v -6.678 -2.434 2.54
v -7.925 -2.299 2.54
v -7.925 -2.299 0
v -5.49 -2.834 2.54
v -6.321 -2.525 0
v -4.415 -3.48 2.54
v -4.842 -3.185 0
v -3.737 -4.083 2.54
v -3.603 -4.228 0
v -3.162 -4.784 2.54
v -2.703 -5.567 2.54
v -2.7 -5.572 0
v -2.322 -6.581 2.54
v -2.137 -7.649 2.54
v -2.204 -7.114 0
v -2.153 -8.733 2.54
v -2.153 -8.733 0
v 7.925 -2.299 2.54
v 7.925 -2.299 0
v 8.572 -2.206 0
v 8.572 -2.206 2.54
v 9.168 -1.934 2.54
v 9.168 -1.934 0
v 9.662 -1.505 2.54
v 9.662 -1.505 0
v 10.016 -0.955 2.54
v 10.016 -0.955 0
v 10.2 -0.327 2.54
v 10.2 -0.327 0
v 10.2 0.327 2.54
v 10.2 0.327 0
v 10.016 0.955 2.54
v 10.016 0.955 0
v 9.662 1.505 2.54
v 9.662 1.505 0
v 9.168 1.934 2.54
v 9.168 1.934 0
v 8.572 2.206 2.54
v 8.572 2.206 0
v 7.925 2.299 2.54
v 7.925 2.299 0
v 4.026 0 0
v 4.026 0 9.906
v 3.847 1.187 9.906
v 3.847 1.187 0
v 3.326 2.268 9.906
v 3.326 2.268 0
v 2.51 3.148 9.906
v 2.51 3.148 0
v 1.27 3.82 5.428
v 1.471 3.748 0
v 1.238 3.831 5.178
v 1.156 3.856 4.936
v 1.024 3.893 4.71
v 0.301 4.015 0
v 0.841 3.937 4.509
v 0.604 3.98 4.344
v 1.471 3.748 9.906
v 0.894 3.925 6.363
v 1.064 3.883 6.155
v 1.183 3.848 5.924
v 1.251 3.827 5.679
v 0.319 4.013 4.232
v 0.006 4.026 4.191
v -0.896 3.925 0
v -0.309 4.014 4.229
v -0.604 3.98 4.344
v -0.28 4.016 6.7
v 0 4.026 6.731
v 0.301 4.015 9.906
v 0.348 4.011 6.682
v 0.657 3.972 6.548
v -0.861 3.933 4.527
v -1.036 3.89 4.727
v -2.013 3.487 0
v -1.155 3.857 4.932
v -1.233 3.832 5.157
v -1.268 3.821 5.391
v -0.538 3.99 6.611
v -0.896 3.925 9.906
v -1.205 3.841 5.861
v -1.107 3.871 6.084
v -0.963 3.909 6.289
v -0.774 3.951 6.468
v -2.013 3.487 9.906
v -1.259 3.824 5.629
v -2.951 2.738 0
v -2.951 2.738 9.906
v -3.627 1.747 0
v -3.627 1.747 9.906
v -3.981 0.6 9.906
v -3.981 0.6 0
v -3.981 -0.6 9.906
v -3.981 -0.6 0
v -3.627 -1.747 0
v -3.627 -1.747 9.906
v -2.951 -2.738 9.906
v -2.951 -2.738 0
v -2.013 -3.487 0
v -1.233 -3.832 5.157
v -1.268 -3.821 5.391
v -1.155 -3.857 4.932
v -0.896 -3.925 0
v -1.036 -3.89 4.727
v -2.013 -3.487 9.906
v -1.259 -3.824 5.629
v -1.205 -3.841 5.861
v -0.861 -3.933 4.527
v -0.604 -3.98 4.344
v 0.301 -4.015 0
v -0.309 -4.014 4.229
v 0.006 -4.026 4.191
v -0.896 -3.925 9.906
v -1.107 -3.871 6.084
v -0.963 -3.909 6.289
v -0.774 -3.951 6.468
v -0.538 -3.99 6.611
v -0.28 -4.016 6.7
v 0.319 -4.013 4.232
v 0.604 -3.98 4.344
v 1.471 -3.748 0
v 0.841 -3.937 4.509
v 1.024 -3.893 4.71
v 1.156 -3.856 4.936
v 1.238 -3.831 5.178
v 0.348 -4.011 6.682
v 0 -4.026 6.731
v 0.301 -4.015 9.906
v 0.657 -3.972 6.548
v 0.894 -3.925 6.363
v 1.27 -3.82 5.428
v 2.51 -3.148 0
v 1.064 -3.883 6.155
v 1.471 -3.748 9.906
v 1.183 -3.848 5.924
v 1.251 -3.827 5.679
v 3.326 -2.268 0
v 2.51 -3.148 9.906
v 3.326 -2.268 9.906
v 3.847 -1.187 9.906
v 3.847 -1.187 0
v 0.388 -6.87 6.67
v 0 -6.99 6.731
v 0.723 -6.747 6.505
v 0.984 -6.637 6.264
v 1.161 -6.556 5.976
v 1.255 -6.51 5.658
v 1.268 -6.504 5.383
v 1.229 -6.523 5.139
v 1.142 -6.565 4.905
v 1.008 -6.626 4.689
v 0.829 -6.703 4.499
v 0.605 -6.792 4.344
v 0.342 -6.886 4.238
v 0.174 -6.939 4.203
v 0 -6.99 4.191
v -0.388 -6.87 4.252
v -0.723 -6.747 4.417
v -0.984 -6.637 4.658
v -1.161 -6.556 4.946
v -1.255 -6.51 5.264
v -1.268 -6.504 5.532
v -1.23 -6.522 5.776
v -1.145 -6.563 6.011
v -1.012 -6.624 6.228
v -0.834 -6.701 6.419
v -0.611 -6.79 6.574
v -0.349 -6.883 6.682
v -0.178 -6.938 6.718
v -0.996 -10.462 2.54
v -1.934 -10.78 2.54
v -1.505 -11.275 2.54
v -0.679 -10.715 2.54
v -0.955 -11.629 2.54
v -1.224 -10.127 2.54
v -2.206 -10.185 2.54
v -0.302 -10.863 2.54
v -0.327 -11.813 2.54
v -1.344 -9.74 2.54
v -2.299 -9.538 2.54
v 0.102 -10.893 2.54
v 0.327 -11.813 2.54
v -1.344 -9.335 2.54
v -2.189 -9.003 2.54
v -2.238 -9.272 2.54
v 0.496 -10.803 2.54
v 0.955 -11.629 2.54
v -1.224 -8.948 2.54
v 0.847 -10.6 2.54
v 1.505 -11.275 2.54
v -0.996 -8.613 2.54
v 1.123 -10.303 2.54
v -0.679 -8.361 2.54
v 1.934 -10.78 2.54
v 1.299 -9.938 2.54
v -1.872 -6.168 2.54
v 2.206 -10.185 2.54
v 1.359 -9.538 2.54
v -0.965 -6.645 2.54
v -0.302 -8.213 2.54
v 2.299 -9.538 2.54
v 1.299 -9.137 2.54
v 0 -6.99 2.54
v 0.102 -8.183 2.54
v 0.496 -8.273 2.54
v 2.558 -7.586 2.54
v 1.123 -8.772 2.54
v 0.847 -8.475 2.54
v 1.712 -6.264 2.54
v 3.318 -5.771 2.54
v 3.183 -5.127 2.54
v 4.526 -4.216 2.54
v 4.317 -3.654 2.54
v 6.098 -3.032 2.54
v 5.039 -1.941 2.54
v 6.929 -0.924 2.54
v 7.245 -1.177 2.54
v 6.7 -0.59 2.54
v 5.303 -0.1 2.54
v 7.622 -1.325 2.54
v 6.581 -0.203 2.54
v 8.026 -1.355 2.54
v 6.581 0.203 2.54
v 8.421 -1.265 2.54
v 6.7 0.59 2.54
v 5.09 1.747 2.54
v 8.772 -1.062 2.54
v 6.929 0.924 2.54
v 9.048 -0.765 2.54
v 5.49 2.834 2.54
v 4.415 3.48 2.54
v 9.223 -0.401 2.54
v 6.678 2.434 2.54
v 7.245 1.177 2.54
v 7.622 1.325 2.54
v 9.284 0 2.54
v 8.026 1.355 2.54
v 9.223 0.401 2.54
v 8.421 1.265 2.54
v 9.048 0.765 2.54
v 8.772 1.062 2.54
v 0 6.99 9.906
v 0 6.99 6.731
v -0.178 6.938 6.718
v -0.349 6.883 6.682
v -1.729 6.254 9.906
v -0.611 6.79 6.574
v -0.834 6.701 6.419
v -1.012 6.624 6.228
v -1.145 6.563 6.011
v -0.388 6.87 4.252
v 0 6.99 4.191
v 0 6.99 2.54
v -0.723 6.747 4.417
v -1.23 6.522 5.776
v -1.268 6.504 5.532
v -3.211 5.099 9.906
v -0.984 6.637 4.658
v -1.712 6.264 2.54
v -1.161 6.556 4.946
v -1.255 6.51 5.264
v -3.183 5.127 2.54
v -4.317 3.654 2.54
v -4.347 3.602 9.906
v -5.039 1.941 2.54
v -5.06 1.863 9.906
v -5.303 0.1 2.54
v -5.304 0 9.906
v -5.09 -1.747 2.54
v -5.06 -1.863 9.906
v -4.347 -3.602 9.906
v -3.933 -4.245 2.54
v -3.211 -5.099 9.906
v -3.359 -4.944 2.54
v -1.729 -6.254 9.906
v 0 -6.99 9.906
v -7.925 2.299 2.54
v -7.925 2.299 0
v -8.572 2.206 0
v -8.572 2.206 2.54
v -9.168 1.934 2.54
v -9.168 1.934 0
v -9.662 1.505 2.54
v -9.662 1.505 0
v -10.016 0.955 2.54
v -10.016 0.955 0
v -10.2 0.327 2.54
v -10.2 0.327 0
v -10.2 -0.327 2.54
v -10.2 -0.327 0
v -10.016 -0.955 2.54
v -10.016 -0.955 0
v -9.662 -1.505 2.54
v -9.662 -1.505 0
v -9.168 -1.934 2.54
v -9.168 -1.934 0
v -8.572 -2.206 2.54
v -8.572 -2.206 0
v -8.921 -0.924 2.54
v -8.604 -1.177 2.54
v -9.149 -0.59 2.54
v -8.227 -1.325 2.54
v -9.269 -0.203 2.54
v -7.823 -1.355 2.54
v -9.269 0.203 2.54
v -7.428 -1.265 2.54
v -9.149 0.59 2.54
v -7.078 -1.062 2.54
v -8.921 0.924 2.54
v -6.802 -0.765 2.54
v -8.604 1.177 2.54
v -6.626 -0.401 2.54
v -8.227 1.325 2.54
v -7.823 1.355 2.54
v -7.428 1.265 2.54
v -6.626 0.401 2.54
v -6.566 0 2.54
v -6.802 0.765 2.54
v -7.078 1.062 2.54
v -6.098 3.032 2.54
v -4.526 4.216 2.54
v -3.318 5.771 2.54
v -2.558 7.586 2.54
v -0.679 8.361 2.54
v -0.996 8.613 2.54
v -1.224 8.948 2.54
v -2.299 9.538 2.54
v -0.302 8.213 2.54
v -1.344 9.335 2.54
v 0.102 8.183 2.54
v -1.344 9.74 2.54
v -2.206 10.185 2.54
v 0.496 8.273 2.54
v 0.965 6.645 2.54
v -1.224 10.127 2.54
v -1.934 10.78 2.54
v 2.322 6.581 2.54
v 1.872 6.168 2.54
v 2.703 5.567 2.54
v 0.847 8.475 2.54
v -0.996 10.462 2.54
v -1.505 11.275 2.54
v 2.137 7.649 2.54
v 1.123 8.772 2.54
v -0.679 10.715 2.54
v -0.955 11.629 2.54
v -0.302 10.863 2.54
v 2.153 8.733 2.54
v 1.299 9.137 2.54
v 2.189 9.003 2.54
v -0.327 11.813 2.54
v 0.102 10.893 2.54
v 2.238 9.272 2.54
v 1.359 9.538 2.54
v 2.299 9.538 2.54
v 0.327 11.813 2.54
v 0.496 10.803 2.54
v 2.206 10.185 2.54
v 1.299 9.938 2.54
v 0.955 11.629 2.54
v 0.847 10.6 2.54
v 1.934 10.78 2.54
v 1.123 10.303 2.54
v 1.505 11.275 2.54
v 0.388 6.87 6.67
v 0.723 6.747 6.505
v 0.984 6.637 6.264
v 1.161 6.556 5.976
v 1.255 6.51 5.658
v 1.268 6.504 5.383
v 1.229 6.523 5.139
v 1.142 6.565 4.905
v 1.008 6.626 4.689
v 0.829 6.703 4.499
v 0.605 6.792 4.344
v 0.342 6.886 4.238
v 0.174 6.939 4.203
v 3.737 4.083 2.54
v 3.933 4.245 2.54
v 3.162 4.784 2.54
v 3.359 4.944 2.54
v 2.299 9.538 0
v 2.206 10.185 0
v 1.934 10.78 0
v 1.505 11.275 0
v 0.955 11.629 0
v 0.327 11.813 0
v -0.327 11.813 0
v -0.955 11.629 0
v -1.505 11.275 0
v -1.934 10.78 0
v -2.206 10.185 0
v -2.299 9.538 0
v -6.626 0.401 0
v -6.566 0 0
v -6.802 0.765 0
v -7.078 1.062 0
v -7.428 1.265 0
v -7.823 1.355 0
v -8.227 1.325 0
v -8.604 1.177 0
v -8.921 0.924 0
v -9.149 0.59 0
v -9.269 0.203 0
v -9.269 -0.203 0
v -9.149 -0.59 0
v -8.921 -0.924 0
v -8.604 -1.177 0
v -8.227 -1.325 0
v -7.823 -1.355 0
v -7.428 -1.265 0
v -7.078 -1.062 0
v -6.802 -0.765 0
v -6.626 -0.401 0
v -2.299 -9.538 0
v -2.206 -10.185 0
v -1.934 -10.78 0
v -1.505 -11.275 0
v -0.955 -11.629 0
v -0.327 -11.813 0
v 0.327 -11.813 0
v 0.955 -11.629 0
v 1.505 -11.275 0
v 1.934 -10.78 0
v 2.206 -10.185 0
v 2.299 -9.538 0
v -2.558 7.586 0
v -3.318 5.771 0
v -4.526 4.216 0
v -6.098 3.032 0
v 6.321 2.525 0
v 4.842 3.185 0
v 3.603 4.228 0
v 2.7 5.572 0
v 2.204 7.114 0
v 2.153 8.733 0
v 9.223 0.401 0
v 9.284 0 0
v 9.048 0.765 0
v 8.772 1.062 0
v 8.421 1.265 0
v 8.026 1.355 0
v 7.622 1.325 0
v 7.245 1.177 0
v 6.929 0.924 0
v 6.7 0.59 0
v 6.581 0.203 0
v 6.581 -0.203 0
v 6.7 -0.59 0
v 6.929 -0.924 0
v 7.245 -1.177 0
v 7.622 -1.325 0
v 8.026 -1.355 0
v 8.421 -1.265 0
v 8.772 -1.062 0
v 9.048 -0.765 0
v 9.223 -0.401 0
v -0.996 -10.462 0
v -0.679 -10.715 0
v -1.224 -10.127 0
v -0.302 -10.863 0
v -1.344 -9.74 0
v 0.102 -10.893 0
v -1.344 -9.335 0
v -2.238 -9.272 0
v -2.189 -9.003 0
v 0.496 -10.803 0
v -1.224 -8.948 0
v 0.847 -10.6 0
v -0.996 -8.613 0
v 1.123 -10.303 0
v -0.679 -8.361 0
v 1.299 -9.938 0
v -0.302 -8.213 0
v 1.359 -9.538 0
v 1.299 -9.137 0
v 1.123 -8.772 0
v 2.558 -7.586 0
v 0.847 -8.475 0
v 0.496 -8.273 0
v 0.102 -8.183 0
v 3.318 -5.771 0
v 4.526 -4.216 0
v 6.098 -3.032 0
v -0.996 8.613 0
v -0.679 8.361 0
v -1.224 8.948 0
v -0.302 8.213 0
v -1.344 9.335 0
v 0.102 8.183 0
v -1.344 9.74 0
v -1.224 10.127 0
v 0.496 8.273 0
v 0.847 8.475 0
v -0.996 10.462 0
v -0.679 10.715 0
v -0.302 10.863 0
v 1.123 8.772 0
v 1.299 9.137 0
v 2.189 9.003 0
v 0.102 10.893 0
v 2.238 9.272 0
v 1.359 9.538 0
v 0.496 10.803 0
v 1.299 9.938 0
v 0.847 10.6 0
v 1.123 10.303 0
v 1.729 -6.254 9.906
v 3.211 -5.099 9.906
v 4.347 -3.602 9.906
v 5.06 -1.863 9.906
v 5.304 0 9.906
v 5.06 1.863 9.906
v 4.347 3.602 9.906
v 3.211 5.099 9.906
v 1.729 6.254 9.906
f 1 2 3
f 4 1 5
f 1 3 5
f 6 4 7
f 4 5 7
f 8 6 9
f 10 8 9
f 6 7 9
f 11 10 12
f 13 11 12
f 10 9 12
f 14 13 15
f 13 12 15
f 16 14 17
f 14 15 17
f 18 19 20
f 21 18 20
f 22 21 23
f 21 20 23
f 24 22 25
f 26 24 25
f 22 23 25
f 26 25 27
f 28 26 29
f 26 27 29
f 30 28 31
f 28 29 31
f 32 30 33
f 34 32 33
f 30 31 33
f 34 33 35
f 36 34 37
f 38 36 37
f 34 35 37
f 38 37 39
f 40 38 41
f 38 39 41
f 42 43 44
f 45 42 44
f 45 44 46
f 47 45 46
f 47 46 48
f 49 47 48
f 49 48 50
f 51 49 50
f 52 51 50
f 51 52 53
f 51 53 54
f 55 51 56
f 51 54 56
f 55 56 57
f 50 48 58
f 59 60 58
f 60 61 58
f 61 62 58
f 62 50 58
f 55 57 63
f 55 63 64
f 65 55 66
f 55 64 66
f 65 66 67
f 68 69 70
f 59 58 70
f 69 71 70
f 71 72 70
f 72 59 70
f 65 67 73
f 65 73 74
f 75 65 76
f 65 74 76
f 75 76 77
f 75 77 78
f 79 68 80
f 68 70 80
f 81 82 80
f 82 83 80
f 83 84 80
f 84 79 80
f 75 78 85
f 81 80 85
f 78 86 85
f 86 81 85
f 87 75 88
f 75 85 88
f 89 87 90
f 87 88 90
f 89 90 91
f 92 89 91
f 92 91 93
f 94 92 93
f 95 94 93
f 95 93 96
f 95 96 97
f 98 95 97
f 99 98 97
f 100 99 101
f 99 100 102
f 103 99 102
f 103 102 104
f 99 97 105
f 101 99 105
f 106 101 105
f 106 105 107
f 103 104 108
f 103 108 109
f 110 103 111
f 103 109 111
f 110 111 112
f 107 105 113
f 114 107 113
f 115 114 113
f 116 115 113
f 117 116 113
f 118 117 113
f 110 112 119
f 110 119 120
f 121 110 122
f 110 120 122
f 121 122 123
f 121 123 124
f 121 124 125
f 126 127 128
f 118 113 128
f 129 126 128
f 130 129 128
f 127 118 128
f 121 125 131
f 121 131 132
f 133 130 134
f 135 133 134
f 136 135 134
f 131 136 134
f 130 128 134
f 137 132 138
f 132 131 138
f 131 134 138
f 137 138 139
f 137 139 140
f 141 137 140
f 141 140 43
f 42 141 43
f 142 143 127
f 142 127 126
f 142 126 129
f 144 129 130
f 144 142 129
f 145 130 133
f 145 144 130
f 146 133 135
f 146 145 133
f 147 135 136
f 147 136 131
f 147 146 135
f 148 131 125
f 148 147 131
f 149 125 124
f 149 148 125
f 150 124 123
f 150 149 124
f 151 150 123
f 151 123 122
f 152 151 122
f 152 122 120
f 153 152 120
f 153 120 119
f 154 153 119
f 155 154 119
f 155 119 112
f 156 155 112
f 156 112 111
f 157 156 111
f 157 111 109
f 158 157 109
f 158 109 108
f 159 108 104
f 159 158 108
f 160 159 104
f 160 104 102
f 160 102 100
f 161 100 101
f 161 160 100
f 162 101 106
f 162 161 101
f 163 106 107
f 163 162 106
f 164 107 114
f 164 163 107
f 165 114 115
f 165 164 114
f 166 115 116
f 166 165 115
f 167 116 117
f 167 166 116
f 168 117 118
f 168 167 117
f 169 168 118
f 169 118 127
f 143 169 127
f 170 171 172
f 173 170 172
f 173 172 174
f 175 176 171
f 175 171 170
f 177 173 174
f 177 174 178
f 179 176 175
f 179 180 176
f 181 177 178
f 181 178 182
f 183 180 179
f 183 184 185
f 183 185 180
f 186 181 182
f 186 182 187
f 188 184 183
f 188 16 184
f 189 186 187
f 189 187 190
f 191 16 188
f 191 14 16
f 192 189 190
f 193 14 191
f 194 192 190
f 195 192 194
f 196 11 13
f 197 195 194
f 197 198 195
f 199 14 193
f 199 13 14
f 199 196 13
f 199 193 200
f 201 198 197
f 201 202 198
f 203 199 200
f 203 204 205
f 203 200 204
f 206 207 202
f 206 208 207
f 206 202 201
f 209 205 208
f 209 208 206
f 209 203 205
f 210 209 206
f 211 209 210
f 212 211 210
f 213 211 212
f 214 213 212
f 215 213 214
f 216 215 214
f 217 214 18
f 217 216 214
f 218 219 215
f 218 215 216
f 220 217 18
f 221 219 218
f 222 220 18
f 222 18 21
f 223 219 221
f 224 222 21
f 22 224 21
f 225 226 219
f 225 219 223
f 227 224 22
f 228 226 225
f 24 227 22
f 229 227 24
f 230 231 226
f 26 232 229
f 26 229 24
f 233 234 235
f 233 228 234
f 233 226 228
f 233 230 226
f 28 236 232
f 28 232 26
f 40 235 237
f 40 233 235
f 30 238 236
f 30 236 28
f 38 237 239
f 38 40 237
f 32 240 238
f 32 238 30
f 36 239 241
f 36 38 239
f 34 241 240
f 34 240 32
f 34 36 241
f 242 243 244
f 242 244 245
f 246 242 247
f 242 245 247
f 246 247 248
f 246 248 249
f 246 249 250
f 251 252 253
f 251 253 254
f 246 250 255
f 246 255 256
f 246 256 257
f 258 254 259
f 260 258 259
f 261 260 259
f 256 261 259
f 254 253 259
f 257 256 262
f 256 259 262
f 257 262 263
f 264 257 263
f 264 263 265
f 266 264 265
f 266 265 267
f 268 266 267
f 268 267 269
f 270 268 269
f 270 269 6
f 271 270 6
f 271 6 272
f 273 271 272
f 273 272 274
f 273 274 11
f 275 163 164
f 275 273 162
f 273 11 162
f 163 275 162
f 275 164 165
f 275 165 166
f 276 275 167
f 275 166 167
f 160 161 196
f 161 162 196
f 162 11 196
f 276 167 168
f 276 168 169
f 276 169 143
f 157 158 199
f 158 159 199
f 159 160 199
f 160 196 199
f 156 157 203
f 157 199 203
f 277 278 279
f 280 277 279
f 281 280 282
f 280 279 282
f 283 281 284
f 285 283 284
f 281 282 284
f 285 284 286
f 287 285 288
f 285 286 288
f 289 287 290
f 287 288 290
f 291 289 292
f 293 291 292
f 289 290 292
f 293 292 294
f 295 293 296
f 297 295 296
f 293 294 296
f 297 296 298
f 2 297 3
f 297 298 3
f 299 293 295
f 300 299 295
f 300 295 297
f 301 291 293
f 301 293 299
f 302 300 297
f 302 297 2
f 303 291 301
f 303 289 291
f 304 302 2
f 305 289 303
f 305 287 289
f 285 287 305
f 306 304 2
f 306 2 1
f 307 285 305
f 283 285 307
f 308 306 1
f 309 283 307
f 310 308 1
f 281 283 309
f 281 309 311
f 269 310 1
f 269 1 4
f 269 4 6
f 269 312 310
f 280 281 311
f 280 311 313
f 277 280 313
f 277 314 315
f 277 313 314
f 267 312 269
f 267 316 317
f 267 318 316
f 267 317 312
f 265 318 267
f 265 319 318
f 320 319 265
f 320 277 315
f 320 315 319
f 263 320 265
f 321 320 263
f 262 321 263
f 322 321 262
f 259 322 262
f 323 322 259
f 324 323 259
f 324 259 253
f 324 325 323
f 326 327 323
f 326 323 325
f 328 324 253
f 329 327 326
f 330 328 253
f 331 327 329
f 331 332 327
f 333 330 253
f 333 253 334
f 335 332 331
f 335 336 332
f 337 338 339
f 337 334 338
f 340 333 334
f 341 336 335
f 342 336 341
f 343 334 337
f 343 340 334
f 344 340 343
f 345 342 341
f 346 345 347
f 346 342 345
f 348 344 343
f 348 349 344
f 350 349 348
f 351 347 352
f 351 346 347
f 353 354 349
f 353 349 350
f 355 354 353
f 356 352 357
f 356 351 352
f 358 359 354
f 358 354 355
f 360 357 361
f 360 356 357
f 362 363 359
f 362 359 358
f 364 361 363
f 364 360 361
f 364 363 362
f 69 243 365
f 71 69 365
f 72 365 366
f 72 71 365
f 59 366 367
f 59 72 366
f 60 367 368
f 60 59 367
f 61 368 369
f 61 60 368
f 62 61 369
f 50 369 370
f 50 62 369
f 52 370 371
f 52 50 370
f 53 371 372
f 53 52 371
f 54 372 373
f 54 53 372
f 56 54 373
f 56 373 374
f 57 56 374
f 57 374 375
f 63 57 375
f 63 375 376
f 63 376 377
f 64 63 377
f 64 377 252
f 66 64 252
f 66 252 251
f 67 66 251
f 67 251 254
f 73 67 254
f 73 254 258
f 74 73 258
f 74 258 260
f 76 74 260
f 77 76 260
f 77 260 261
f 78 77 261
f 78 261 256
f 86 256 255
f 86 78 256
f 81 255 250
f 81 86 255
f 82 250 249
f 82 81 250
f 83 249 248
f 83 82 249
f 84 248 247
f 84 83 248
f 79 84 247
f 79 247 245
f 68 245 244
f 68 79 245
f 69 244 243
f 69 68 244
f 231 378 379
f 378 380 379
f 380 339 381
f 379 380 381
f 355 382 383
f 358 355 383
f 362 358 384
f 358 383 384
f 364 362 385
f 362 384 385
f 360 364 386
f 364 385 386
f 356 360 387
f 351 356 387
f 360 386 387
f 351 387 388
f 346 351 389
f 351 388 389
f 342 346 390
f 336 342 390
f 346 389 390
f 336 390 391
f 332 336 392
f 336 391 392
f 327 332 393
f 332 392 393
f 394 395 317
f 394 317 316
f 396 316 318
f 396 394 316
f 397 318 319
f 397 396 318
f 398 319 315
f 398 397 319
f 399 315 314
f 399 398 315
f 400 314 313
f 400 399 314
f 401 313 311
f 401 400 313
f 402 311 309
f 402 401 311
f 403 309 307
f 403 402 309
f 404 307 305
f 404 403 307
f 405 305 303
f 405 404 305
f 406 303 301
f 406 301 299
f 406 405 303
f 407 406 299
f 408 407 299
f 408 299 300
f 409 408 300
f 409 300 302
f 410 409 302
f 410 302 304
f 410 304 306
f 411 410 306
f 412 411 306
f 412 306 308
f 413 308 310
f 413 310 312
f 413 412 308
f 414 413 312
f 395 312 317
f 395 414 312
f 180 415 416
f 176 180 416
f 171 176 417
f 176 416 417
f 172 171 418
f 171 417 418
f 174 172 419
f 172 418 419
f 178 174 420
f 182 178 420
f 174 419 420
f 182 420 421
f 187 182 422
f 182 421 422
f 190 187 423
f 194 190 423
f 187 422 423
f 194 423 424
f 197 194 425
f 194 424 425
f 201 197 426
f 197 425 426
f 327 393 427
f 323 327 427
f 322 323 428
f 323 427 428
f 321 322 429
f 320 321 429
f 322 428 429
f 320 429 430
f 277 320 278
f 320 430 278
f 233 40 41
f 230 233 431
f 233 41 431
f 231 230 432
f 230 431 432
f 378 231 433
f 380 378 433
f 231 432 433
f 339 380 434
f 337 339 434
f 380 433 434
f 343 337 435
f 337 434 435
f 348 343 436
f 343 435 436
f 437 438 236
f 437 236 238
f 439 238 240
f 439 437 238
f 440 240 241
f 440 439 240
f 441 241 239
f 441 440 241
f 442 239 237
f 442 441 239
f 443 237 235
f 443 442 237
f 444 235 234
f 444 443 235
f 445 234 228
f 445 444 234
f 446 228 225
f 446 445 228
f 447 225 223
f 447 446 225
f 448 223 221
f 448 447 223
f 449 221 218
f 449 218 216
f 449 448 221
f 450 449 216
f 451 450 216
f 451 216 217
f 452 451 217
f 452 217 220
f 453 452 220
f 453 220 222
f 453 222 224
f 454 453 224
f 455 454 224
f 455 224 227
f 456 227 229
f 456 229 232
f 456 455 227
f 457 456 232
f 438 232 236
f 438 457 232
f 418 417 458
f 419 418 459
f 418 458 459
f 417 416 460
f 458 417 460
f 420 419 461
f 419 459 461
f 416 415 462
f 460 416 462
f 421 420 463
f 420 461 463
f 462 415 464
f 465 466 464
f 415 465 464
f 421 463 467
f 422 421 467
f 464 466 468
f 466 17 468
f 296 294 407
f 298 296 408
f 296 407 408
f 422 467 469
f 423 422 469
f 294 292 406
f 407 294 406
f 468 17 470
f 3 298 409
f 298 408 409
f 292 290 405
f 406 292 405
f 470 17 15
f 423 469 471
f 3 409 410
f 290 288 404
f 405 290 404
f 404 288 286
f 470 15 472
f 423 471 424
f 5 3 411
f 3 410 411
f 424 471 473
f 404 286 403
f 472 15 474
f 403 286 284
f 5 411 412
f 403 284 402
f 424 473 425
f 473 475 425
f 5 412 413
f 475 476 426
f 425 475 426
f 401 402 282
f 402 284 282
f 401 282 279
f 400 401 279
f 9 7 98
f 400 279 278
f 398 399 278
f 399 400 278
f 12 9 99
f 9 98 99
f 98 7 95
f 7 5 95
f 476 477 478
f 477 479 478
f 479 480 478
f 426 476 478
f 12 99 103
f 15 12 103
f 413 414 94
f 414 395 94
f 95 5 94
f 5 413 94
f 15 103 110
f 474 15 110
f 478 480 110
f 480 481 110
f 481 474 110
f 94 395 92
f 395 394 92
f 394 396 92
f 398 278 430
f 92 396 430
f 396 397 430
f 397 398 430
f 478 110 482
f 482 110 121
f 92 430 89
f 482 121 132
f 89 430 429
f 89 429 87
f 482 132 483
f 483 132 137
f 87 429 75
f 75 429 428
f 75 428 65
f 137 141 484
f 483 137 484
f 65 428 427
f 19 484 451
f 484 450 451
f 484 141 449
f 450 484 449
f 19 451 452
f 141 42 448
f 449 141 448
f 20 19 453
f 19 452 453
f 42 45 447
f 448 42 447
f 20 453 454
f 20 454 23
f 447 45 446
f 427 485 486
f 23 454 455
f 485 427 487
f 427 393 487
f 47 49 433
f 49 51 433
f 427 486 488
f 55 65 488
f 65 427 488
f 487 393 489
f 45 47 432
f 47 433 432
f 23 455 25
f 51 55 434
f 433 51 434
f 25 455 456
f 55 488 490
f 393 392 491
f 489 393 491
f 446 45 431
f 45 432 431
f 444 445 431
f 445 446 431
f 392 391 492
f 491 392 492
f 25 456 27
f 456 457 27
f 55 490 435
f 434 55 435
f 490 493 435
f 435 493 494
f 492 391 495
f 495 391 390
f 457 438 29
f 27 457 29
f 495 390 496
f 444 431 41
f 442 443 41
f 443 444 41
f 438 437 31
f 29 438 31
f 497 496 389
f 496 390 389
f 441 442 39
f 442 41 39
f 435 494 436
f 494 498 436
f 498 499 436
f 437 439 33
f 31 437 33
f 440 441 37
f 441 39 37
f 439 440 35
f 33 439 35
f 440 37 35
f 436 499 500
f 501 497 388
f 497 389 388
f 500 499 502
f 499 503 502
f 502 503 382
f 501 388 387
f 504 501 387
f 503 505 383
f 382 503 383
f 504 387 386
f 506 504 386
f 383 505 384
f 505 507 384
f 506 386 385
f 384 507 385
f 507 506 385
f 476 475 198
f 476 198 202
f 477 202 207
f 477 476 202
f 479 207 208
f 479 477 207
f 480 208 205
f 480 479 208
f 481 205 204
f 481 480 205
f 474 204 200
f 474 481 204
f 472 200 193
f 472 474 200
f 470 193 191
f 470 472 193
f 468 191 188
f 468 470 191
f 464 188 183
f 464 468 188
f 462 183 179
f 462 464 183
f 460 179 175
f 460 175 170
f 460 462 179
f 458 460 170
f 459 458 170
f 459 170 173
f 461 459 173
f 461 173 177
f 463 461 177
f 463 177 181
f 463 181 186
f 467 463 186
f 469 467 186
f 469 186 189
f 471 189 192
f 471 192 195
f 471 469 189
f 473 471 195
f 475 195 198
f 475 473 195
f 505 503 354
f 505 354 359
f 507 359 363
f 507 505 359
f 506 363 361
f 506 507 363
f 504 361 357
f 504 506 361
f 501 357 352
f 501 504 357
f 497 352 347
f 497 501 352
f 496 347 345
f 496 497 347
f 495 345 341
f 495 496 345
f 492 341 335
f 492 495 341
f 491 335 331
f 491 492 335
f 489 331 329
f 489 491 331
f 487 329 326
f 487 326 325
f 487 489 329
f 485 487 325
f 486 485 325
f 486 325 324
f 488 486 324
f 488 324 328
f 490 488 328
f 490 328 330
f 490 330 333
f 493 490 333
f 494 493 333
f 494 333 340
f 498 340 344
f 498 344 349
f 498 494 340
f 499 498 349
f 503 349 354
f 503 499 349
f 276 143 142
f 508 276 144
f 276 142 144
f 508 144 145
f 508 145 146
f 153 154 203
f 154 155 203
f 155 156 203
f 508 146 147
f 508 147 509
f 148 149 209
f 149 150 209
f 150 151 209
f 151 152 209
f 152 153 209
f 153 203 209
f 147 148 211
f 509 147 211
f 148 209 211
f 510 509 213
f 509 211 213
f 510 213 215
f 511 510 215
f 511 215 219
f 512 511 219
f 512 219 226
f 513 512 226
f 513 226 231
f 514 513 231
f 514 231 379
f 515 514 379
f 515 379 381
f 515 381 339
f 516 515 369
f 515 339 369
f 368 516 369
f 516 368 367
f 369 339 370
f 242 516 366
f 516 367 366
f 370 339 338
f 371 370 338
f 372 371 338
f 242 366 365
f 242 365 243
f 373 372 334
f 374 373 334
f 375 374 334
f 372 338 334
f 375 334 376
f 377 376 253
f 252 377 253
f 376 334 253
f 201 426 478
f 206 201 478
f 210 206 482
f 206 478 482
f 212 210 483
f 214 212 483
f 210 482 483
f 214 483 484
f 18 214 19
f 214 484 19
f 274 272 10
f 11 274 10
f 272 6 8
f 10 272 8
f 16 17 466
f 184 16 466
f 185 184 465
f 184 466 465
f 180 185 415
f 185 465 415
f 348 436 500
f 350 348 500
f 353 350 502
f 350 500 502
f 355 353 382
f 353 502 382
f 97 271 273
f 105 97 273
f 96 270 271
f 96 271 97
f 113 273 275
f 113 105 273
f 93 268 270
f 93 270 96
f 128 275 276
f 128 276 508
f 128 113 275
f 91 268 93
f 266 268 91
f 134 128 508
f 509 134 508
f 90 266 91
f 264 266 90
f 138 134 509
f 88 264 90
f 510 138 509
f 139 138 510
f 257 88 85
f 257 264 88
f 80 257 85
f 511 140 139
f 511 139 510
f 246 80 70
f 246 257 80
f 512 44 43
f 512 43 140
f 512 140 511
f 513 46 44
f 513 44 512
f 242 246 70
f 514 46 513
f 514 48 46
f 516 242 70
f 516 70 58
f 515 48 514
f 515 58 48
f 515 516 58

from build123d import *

# Parameters (mm, degrees)
SKETCH1_R               = 1.3589
EXTRUDE1_DEPTH          = 2.54
EXTRUDE2_DEPTH          = 7.366
SKETCH3_R               = 4.0259
CUT_EXTRUDE1_DEPTH      = 19.513485712
CUT_EXTRUDE2_DEPTH      = 19.513485712
CUT_EXTRUDE2_DEPTH_BACK = 7.366
SKETCH4_R               = 1.27


with BuildPart() as part:
    # Sketch1 → Extrude1 (new body)
    with BuildSketch(Plane.XY):
        with BuildLine():
            ThreePointArc((7.9248, 2.2987), (3.603126127, 4.22759635), (2.153092948, 8.732583583))
            ThreePointArc((2.153092948, 8.732583583), (2.211696246, 9.137709934), (2.2987, 9.5377))
            ThreePointArc((2.2987, 9.5377), (0, 11.8364), (-2.2987, 9.5377))
            ThreePointArc((-2.2987, 9.5377), (-3.870608713, 4.953593702), (-7.9248, 2.2987))
            ThreePointArc((-7.9248, 2.2987), (-10.2235, 0), (-7.9248, -2.2987))
            ThreePointArc((-7.9248, -2.2987), (-3.603126127, -4.22759635), (-2.153092948, -8.732583583))
            ThreePointArc((-2.153092948, -8.732583583), (-2.211696246, -9.137709934), (-2.2987, -9.5377))
            ThreePointArc((-2.2987, -9.5377), (0, -11.8364), (2.2987, -9.5377))
            ThreePointArc((2.2987, -9.5377), (3.870608713, -4.953593702), (7.9248, -2.2987))
            ThreePointArc((7.9248, -2.2987), (10.2235, 0), (7.9248, 2.2987))
        make_face()
        with Locations((0, -9.5377)):
            Circle(SKETCH1_R, mode=Mode.SUBTRACT)
        with Locations((-7.9248, 0)):
            Circle(SKETCH1_R, mode=Mode.SUBTRACT)
        with Locations((7.9248, 0)):
            Circle(SKETCH1_R, mode=Mode.SUBTRACT)
        with Locations((0, 9.5377)):
            Circle(SKETCH1_R, mode=Mode.SUBTRACT)
    extrude(amount=EXTRUDE1_DEPTH)

    # Sketch2 → Extrude2 (add)
    with BuildSketch(Plane.XY.offset(2.54)):
        with BuildLine():
            ThreePointArc((0, 6.990319603), (-5.303505549, 0), (0, -6.990319603))
            ThreePointArc((0, -6.990319603), (5.303505549, 0), (0, 6.990319603))
        make_face()
    extrude(amount=EXTRUDE2_DEPTH)

    # Sketch3 → Cut-Extrude1 (cut, through all)
    with BuildSketch(Plane.XY.offset(9.906)):
        Circle(SKETCH3_R)
    extrude(amount=-CUT_EXTRUDE1_DEPTH, mode=Mode.SUBTRACT)

    # Sketch4 → Cut-Extrude2 (cut, two sides: drawn at the far end of the back side and taken through both)
    with BuildSketch(Plane(origin=(0, 0, 0), x_dir=(1, 0, 0), z_dir=(0, 1, 0)).offset(-CUT_EXTRUDE2_DEPTH_BACK)):
        with Locations(Location((0, -5.461, 0), (0, 0, 270))):
            Circle(SKETCH4_R)
    extrude(amount=CUT_EXTRUDE2_DEPTH + CUT_EXTRUDE2_DEPTH_BACK, mode=Mode.SUBTRACT)


solid = part.part
